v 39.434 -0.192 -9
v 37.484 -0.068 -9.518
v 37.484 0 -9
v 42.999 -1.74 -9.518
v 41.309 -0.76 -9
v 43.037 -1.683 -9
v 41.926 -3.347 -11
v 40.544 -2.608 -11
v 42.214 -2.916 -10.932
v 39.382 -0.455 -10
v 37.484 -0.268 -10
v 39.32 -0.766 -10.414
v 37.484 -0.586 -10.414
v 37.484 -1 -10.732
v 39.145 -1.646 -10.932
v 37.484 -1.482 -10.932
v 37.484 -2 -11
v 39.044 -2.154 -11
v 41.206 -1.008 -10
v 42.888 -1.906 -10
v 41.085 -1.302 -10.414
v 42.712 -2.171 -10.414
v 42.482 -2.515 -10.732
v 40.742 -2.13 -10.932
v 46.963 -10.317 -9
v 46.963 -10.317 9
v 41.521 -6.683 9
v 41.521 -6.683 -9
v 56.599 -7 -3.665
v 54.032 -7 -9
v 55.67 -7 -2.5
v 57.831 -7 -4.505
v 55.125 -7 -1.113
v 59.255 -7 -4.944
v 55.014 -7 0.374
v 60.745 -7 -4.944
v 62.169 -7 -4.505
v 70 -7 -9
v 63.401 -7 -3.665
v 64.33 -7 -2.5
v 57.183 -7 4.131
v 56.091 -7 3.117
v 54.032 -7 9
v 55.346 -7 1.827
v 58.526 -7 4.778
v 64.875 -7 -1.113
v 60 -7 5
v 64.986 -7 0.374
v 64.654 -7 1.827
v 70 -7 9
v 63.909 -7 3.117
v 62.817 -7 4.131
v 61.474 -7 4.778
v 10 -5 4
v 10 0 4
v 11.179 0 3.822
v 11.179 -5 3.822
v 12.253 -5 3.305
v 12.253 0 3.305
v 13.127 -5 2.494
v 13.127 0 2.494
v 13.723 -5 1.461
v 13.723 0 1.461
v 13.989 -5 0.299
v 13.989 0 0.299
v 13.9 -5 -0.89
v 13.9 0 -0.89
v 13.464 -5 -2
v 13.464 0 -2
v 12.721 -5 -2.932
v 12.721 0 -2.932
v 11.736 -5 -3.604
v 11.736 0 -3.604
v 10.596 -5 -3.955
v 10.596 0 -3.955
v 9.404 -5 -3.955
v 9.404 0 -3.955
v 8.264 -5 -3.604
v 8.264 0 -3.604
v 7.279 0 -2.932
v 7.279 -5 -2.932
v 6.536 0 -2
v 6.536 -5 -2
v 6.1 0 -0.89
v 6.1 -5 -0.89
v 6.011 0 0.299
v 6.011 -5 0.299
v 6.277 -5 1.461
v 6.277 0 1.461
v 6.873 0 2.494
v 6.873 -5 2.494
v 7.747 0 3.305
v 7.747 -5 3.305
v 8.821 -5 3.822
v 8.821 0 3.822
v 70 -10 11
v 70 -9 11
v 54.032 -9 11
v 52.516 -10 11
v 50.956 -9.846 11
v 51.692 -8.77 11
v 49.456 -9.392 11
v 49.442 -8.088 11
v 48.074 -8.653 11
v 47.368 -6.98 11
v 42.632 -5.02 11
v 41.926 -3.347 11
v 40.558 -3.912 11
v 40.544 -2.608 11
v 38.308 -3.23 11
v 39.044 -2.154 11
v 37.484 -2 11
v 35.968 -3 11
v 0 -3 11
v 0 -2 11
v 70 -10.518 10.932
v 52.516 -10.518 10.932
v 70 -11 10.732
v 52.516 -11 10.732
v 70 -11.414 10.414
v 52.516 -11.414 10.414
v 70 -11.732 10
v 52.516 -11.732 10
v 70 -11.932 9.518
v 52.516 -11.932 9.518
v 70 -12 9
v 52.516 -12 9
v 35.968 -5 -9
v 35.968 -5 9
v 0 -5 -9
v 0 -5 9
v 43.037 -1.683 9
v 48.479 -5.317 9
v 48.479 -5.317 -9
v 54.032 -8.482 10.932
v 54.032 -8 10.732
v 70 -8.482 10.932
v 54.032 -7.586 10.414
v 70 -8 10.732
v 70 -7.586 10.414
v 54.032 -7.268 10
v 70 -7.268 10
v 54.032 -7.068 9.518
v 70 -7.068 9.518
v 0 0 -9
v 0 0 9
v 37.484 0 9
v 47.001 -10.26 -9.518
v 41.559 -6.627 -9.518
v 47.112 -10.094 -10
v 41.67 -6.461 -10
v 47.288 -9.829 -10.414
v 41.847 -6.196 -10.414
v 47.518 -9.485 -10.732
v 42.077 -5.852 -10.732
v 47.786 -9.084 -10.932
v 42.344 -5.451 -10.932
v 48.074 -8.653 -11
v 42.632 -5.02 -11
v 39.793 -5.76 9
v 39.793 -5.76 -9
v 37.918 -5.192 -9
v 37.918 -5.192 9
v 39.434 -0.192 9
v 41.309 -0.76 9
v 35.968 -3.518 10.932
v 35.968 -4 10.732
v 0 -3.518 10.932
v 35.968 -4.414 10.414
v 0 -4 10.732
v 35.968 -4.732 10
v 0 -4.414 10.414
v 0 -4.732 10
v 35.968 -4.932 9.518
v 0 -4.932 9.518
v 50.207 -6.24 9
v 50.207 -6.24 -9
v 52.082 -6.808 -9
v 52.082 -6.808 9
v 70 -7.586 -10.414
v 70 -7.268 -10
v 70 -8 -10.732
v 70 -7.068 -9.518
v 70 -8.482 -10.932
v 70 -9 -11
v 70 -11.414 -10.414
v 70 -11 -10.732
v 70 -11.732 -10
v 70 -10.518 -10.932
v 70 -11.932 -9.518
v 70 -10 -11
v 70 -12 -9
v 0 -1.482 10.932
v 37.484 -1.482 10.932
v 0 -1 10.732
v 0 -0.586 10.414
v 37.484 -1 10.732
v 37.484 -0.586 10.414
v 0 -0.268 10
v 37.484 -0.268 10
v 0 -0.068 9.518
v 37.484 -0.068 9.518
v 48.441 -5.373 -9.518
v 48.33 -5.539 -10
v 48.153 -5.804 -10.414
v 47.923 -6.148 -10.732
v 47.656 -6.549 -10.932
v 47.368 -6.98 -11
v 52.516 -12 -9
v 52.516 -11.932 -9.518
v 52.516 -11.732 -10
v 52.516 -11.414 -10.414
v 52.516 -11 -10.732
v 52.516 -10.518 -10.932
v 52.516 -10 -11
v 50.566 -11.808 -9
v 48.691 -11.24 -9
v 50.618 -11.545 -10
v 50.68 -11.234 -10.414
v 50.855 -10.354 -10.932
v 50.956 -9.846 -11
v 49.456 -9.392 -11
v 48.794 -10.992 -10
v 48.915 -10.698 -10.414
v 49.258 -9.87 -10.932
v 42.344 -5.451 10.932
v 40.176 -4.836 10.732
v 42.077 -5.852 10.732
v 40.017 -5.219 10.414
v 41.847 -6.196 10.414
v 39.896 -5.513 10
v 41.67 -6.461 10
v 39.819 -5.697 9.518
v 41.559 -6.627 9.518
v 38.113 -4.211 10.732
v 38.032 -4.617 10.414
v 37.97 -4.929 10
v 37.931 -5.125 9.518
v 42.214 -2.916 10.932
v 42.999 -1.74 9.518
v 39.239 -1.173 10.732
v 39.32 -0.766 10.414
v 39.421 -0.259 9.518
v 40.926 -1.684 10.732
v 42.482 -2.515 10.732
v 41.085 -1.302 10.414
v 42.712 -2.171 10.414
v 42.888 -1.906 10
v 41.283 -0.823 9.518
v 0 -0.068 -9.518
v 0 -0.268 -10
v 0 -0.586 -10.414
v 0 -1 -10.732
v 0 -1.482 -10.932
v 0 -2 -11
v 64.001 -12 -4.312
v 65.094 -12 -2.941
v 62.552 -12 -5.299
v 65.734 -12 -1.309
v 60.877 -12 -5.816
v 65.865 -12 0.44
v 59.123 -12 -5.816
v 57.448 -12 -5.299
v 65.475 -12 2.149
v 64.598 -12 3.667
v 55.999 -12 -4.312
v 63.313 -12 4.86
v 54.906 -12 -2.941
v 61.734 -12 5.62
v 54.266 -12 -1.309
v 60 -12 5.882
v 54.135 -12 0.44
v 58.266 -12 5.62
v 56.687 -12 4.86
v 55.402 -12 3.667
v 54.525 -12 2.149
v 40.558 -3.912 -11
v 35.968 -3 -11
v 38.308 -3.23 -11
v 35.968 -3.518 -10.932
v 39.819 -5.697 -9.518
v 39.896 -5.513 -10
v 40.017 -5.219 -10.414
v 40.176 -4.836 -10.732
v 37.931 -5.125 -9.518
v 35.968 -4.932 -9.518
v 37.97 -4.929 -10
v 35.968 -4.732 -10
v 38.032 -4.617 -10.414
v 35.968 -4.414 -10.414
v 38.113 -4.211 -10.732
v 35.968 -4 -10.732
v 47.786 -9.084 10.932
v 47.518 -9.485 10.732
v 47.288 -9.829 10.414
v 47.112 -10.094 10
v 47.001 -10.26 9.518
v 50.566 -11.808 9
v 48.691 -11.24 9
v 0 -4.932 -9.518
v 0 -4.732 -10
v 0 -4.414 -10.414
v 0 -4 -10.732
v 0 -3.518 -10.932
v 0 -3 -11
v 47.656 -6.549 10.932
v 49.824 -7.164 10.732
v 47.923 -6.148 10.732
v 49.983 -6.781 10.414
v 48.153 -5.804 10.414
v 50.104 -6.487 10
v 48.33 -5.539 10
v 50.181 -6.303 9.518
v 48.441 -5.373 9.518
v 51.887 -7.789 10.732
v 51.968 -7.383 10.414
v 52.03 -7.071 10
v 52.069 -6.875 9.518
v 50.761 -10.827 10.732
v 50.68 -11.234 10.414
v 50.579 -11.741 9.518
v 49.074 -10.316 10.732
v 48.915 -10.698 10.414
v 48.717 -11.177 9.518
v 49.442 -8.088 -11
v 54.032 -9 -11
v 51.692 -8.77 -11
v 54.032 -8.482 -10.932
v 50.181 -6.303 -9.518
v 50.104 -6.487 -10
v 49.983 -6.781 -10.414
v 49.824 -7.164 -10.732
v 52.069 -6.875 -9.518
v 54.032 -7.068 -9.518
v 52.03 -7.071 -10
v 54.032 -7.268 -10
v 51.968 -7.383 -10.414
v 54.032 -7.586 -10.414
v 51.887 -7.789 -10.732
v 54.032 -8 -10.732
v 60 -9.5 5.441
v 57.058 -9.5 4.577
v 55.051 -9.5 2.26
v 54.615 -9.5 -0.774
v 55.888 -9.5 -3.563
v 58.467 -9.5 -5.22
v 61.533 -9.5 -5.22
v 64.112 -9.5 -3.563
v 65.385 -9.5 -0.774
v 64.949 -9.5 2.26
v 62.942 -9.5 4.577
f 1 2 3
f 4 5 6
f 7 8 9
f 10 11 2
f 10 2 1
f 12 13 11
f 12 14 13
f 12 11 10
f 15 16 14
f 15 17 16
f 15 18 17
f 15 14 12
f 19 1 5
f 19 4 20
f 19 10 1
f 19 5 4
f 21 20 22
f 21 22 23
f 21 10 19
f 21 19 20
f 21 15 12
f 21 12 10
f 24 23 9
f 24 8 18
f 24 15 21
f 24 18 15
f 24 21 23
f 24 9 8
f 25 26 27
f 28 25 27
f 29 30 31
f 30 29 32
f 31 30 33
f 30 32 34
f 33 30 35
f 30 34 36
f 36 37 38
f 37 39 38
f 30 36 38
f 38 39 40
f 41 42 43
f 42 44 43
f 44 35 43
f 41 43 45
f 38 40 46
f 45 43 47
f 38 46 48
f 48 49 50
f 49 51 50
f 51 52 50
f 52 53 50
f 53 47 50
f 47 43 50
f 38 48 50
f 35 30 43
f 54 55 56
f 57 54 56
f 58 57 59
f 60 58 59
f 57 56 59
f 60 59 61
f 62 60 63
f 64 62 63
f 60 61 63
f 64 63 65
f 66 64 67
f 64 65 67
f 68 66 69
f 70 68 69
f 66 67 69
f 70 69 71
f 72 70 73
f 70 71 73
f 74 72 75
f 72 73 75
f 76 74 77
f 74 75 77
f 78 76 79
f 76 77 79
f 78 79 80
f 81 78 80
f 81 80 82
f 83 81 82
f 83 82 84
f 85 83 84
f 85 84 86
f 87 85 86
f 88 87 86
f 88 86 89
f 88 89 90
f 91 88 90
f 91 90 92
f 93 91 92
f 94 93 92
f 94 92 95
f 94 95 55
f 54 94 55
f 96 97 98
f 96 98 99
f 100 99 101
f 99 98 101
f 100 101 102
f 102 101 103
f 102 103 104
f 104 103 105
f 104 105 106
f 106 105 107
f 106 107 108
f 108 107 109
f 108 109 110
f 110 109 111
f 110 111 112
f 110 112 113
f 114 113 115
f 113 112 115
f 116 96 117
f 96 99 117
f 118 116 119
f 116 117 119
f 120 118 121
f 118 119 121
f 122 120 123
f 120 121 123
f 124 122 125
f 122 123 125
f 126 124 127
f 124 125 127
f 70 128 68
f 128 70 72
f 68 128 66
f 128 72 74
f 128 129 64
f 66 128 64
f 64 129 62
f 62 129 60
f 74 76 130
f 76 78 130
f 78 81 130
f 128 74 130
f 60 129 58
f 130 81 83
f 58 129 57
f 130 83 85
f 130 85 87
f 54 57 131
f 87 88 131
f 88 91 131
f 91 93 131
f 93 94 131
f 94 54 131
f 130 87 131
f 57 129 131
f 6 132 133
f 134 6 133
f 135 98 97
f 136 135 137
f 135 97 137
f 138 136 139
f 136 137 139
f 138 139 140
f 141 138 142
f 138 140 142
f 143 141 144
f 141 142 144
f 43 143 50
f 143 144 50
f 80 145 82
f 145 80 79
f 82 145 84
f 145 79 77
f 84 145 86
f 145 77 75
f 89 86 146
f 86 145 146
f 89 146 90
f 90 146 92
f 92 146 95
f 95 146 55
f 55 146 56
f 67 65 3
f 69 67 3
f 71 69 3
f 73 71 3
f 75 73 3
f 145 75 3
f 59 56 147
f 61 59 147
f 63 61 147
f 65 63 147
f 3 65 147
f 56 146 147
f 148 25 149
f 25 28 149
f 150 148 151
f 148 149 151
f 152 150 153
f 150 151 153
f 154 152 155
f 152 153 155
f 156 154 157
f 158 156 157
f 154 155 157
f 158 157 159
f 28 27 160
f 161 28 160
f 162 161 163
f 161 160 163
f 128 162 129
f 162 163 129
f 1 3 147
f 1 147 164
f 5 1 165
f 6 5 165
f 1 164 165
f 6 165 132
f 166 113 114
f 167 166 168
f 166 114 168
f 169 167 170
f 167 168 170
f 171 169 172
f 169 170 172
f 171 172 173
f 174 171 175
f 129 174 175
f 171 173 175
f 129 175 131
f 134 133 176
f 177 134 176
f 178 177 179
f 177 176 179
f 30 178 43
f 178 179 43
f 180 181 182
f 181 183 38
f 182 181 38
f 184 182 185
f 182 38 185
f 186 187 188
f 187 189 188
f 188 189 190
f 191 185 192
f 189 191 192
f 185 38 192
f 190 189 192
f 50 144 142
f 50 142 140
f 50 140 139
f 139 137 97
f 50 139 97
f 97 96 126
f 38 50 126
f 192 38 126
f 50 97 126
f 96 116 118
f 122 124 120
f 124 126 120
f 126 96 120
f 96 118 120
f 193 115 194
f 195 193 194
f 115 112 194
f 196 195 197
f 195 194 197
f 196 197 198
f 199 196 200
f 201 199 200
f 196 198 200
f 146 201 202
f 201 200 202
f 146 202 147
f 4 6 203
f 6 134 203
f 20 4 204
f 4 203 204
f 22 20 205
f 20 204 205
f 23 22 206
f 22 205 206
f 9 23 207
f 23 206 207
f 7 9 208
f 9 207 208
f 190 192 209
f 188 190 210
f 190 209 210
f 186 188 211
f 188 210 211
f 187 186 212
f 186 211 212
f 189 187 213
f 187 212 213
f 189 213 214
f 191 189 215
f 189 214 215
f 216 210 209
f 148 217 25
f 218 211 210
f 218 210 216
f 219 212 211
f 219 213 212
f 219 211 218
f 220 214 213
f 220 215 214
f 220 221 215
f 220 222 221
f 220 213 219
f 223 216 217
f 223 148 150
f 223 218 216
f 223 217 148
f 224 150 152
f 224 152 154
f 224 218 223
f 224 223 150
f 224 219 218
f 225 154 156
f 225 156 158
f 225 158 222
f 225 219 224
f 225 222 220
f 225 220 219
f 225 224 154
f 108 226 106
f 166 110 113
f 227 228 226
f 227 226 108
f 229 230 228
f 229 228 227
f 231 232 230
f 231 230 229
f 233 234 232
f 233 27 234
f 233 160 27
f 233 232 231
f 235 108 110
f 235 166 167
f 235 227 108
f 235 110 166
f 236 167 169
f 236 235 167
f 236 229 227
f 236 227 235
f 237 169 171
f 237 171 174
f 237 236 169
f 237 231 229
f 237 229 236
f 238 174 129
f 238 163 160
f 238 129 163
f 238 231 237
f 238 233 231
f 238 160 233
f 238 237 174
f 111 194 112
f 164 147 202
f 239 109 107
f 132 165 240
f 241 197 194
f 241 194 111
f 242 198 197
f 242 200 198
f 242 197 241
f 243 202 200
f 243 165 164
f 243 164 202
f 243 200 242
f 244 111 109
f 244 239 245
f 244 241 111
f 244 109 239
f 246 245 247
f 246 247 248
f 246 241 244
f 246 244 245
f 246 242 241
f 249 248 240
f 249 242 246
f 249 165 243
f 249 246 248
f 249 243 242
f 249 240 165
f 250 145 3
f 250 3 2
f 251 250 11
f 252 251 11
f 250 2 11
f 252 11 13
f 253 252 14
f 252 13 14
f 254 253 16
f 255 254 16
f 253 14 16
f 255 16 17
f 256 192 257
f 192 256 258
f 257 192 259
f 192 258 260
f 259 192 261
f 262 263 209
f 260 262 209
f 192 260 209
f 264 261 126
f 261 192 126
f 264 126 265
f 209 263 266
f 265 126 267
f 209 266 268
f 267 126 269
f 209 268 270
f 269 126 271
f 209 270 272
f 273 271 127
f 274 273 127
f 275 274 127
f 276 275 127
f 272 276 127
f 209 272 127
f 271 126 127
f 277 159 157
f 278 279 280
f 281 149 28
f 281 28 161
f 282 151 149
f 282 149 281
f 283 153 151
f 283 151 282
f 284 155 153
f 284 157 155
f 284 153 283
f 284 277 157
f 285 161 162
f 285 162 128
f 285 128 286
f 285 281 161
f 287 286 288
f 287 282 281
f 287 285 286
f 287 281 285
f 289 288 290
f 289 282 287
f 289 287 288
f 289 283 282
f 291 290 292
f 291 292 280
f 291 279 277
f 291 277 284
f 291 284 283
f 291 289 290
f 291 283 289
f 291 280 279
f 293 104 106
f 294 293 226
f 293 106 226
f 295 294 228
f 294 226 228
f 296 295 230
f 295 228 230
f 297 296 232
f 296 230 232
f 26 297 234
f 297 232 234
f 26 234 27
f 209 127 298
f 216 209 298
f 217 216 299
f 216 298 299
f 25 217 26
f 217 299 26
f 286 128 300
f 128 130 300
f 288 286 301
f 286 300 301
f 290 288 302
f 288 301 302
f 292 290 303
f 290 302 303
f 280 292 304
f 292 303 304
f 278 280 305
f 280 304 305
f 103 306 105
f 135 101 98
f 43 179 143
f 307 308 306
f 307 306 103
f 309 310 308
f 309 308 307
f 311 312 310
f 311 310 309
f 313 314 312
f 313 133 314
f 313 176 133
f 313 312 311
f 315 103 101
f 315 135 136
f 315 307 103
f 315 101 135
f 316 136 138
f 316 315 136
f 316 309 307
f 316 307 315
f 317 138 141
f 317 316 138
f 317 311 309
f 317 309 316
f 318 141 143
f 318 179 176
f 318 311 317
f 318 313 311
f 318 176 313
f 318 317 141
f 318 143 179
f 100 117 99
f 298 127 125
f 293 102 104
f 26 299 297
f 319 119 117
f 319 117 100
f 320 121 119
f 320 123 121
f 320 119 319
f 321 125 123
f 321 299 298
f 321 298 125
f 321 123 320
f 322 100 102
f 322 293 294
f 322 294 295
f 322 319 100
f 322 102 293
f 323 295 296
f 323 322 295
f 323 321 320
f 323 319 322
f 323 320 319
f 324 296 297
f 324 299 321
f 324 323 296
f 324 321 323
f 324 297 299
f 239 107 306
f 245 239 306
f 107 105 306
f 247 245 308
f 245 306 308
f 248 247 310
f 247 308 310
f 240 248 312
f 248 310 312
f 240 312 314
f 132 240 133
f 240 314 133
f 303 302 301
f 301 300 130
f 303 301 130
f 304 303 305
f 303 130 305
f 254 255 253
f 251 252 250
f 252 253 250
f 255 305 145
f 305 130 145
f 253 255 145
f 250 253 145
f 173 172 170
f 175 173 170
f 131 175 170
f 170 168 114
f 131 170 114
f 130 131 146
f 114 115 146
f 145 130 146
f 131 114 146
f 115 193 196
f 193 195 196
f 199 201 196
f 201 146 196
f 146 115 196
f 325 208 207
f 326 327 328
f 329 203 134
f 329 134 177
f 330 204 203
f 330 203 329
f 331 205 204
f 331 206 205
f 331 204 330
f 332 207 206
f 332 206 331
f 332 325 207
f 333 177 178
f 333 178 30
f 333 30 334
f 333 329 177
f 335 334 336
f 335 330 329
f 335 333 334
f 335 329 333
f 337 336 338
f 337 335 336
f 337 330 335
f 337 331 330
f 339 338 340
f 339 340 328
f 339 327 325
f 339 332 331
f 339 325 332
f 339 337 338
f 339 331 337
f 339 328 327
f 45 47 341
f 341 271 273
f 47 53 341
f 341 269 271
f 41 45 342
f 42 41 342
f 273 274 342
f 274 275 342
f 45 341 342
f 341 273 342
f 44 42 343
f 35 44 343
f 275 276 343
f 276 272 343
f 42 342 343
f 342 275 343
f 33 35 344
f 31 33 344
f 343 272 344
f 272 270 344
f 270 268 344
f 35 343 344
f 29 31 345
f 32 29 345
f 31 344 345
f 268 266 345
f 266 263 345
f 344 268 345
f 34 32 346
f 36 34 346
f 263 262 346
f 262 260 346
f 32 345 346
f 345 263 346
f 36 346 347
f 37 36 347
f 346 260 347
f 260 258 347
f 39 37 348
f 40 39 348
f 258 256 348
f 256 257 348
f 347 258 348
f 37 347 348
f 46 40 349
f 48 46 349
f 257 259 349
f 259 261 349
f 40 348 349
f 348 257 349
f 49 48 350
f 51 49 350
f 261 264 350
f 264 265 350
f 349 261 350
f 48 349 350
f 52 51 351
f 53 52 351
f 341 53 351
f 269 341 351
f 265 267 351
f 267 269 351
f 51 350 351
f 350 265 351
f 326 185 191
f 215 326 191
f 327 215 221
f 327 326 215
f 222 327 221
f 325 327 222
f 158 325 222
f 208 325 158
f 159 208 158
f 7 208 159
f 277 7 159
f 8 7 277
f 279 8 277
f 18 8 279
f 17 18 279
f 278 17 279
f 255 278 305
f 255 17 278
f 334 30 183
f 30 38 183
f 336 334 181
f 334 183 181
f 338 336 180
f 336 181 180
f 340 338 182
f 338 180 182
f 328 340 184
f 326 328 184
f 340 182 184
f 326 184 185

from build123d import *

# Parameters (mm, degrees)
EXTRUSION1_DEPTH        = 11
CONG_2_R                = 2
ESQUISSE2_R             = 4
ENL_V_MAT_EXTRU_1_DEPTH = 72.867934435


with BuildPart() as part:
    # Esquisse1 → Extrusion1 (new, symmetric)
    with BuildSketch(Plane.XY):
        with BuildLine():
            Line((0, 0), (37.484227511, 0))
            ThreePointArc((37.484227511, 0), (40.385390018, -0.430085888), (43.037002714, -1.683348779))
            Line((43.037002714, -1.683348779), (48.478769775, -5.316651221))
            ThreePointArc((48.478769775, -5.316651221), (51.130382471, -6.569914112), (54.031544979, -7))
            Line((54.031544979, -7), (70, -7))
            Line((70, -7), (70, -12))
            Line((70, -12), (52.515772489, -12))
            ThreePointArc((52.515772489, -12), (49.614609982, -11.569914112), (46.962997286, -10.316651221))
            Line((46.962997286, -10.316651221), (41.521230225, -6.683348779))
            ThreePointArc((41.521230225, -6.683348779), (38.869617529, -5.430085888), (35.968455021, -5))
            Line((35.968455021, -5), (0, -5))
            Line((0, -5), (0, 0))
        make_face()
    extrude(amount=EXTRUSION1_DEPTH, both=True)

    # Congé2
    cong_2_edges = [part.edges().sort_by_distance(p)[0] for p in [
        (38.869617529, -5.430085888, 11),
        (40.385390018, -0.430085888, -11),
        (45.757886245, -3.5, -11),
        (51.130382471, -6.569914112, -11),
        (62.015772489, -7, -11),
        (61.257886245, -12, -11),
        (49.614609982, -11.569914112, -11),
        (44.242113755, -8.5, -11),
        (44.242113755, -8.5, 11),
        (38.869617529, -5.430085888, -11),
        (17.984227511, -5, -11),
        (49.614609982, -11.569914112, 11),
        (61.257886245, -12, 11),
        (62.015772489, -7, 11),
        (51.130382471, -6.569914112, 11),
        (45.757886245, -3.5, 11),
        (40.385390018, -0.430085888, 11),
        (18.742113755, 0, 11),
        (17.984227511, -5, 11),
        (18.742113755, 0, -11),
    ]]
    fillet(cong_2_edges, radius=CONG_2_R)

    # Esquisse2 → Enlèv. mat.-Extru.1 (cut, through all)
    with BuildSketch(Plane(origin=(0, 0, 0), x_dir=(-1, 0, 0), z_dir=(0, 1, 0))):
        with Locations(Location((-10, 0, 0), (0, 0, 90))):
            Circle(ESQUISSE2_R)
    extrude(amount=-ENL_V_MAT_EXTRU_1_DEPTH, mode=Mode.SUBTRACT)

    # Esquisse3 → Enlèvement de matière-Révolution1 (revolve, cut)
    with BuildSketch(Plane.XY, mode=Mode.PRIVATE) as enl_vement_de_mati_re_r_volution1_sk:
        Polygon((65, -7), (65.881634904, -12), (60, -12), (60, -7), align=None)
    revolve(enl_vement_de_mati_re_r_volution1_sk.sketch.rotate(Axis((60, 1.983898021, 0), (0, -1, 0)), 90), axis=Axis((60, 1.983898021, 0), (0, -1, 0)), mode=Mode.SUBTRACT)


solid = part.part
